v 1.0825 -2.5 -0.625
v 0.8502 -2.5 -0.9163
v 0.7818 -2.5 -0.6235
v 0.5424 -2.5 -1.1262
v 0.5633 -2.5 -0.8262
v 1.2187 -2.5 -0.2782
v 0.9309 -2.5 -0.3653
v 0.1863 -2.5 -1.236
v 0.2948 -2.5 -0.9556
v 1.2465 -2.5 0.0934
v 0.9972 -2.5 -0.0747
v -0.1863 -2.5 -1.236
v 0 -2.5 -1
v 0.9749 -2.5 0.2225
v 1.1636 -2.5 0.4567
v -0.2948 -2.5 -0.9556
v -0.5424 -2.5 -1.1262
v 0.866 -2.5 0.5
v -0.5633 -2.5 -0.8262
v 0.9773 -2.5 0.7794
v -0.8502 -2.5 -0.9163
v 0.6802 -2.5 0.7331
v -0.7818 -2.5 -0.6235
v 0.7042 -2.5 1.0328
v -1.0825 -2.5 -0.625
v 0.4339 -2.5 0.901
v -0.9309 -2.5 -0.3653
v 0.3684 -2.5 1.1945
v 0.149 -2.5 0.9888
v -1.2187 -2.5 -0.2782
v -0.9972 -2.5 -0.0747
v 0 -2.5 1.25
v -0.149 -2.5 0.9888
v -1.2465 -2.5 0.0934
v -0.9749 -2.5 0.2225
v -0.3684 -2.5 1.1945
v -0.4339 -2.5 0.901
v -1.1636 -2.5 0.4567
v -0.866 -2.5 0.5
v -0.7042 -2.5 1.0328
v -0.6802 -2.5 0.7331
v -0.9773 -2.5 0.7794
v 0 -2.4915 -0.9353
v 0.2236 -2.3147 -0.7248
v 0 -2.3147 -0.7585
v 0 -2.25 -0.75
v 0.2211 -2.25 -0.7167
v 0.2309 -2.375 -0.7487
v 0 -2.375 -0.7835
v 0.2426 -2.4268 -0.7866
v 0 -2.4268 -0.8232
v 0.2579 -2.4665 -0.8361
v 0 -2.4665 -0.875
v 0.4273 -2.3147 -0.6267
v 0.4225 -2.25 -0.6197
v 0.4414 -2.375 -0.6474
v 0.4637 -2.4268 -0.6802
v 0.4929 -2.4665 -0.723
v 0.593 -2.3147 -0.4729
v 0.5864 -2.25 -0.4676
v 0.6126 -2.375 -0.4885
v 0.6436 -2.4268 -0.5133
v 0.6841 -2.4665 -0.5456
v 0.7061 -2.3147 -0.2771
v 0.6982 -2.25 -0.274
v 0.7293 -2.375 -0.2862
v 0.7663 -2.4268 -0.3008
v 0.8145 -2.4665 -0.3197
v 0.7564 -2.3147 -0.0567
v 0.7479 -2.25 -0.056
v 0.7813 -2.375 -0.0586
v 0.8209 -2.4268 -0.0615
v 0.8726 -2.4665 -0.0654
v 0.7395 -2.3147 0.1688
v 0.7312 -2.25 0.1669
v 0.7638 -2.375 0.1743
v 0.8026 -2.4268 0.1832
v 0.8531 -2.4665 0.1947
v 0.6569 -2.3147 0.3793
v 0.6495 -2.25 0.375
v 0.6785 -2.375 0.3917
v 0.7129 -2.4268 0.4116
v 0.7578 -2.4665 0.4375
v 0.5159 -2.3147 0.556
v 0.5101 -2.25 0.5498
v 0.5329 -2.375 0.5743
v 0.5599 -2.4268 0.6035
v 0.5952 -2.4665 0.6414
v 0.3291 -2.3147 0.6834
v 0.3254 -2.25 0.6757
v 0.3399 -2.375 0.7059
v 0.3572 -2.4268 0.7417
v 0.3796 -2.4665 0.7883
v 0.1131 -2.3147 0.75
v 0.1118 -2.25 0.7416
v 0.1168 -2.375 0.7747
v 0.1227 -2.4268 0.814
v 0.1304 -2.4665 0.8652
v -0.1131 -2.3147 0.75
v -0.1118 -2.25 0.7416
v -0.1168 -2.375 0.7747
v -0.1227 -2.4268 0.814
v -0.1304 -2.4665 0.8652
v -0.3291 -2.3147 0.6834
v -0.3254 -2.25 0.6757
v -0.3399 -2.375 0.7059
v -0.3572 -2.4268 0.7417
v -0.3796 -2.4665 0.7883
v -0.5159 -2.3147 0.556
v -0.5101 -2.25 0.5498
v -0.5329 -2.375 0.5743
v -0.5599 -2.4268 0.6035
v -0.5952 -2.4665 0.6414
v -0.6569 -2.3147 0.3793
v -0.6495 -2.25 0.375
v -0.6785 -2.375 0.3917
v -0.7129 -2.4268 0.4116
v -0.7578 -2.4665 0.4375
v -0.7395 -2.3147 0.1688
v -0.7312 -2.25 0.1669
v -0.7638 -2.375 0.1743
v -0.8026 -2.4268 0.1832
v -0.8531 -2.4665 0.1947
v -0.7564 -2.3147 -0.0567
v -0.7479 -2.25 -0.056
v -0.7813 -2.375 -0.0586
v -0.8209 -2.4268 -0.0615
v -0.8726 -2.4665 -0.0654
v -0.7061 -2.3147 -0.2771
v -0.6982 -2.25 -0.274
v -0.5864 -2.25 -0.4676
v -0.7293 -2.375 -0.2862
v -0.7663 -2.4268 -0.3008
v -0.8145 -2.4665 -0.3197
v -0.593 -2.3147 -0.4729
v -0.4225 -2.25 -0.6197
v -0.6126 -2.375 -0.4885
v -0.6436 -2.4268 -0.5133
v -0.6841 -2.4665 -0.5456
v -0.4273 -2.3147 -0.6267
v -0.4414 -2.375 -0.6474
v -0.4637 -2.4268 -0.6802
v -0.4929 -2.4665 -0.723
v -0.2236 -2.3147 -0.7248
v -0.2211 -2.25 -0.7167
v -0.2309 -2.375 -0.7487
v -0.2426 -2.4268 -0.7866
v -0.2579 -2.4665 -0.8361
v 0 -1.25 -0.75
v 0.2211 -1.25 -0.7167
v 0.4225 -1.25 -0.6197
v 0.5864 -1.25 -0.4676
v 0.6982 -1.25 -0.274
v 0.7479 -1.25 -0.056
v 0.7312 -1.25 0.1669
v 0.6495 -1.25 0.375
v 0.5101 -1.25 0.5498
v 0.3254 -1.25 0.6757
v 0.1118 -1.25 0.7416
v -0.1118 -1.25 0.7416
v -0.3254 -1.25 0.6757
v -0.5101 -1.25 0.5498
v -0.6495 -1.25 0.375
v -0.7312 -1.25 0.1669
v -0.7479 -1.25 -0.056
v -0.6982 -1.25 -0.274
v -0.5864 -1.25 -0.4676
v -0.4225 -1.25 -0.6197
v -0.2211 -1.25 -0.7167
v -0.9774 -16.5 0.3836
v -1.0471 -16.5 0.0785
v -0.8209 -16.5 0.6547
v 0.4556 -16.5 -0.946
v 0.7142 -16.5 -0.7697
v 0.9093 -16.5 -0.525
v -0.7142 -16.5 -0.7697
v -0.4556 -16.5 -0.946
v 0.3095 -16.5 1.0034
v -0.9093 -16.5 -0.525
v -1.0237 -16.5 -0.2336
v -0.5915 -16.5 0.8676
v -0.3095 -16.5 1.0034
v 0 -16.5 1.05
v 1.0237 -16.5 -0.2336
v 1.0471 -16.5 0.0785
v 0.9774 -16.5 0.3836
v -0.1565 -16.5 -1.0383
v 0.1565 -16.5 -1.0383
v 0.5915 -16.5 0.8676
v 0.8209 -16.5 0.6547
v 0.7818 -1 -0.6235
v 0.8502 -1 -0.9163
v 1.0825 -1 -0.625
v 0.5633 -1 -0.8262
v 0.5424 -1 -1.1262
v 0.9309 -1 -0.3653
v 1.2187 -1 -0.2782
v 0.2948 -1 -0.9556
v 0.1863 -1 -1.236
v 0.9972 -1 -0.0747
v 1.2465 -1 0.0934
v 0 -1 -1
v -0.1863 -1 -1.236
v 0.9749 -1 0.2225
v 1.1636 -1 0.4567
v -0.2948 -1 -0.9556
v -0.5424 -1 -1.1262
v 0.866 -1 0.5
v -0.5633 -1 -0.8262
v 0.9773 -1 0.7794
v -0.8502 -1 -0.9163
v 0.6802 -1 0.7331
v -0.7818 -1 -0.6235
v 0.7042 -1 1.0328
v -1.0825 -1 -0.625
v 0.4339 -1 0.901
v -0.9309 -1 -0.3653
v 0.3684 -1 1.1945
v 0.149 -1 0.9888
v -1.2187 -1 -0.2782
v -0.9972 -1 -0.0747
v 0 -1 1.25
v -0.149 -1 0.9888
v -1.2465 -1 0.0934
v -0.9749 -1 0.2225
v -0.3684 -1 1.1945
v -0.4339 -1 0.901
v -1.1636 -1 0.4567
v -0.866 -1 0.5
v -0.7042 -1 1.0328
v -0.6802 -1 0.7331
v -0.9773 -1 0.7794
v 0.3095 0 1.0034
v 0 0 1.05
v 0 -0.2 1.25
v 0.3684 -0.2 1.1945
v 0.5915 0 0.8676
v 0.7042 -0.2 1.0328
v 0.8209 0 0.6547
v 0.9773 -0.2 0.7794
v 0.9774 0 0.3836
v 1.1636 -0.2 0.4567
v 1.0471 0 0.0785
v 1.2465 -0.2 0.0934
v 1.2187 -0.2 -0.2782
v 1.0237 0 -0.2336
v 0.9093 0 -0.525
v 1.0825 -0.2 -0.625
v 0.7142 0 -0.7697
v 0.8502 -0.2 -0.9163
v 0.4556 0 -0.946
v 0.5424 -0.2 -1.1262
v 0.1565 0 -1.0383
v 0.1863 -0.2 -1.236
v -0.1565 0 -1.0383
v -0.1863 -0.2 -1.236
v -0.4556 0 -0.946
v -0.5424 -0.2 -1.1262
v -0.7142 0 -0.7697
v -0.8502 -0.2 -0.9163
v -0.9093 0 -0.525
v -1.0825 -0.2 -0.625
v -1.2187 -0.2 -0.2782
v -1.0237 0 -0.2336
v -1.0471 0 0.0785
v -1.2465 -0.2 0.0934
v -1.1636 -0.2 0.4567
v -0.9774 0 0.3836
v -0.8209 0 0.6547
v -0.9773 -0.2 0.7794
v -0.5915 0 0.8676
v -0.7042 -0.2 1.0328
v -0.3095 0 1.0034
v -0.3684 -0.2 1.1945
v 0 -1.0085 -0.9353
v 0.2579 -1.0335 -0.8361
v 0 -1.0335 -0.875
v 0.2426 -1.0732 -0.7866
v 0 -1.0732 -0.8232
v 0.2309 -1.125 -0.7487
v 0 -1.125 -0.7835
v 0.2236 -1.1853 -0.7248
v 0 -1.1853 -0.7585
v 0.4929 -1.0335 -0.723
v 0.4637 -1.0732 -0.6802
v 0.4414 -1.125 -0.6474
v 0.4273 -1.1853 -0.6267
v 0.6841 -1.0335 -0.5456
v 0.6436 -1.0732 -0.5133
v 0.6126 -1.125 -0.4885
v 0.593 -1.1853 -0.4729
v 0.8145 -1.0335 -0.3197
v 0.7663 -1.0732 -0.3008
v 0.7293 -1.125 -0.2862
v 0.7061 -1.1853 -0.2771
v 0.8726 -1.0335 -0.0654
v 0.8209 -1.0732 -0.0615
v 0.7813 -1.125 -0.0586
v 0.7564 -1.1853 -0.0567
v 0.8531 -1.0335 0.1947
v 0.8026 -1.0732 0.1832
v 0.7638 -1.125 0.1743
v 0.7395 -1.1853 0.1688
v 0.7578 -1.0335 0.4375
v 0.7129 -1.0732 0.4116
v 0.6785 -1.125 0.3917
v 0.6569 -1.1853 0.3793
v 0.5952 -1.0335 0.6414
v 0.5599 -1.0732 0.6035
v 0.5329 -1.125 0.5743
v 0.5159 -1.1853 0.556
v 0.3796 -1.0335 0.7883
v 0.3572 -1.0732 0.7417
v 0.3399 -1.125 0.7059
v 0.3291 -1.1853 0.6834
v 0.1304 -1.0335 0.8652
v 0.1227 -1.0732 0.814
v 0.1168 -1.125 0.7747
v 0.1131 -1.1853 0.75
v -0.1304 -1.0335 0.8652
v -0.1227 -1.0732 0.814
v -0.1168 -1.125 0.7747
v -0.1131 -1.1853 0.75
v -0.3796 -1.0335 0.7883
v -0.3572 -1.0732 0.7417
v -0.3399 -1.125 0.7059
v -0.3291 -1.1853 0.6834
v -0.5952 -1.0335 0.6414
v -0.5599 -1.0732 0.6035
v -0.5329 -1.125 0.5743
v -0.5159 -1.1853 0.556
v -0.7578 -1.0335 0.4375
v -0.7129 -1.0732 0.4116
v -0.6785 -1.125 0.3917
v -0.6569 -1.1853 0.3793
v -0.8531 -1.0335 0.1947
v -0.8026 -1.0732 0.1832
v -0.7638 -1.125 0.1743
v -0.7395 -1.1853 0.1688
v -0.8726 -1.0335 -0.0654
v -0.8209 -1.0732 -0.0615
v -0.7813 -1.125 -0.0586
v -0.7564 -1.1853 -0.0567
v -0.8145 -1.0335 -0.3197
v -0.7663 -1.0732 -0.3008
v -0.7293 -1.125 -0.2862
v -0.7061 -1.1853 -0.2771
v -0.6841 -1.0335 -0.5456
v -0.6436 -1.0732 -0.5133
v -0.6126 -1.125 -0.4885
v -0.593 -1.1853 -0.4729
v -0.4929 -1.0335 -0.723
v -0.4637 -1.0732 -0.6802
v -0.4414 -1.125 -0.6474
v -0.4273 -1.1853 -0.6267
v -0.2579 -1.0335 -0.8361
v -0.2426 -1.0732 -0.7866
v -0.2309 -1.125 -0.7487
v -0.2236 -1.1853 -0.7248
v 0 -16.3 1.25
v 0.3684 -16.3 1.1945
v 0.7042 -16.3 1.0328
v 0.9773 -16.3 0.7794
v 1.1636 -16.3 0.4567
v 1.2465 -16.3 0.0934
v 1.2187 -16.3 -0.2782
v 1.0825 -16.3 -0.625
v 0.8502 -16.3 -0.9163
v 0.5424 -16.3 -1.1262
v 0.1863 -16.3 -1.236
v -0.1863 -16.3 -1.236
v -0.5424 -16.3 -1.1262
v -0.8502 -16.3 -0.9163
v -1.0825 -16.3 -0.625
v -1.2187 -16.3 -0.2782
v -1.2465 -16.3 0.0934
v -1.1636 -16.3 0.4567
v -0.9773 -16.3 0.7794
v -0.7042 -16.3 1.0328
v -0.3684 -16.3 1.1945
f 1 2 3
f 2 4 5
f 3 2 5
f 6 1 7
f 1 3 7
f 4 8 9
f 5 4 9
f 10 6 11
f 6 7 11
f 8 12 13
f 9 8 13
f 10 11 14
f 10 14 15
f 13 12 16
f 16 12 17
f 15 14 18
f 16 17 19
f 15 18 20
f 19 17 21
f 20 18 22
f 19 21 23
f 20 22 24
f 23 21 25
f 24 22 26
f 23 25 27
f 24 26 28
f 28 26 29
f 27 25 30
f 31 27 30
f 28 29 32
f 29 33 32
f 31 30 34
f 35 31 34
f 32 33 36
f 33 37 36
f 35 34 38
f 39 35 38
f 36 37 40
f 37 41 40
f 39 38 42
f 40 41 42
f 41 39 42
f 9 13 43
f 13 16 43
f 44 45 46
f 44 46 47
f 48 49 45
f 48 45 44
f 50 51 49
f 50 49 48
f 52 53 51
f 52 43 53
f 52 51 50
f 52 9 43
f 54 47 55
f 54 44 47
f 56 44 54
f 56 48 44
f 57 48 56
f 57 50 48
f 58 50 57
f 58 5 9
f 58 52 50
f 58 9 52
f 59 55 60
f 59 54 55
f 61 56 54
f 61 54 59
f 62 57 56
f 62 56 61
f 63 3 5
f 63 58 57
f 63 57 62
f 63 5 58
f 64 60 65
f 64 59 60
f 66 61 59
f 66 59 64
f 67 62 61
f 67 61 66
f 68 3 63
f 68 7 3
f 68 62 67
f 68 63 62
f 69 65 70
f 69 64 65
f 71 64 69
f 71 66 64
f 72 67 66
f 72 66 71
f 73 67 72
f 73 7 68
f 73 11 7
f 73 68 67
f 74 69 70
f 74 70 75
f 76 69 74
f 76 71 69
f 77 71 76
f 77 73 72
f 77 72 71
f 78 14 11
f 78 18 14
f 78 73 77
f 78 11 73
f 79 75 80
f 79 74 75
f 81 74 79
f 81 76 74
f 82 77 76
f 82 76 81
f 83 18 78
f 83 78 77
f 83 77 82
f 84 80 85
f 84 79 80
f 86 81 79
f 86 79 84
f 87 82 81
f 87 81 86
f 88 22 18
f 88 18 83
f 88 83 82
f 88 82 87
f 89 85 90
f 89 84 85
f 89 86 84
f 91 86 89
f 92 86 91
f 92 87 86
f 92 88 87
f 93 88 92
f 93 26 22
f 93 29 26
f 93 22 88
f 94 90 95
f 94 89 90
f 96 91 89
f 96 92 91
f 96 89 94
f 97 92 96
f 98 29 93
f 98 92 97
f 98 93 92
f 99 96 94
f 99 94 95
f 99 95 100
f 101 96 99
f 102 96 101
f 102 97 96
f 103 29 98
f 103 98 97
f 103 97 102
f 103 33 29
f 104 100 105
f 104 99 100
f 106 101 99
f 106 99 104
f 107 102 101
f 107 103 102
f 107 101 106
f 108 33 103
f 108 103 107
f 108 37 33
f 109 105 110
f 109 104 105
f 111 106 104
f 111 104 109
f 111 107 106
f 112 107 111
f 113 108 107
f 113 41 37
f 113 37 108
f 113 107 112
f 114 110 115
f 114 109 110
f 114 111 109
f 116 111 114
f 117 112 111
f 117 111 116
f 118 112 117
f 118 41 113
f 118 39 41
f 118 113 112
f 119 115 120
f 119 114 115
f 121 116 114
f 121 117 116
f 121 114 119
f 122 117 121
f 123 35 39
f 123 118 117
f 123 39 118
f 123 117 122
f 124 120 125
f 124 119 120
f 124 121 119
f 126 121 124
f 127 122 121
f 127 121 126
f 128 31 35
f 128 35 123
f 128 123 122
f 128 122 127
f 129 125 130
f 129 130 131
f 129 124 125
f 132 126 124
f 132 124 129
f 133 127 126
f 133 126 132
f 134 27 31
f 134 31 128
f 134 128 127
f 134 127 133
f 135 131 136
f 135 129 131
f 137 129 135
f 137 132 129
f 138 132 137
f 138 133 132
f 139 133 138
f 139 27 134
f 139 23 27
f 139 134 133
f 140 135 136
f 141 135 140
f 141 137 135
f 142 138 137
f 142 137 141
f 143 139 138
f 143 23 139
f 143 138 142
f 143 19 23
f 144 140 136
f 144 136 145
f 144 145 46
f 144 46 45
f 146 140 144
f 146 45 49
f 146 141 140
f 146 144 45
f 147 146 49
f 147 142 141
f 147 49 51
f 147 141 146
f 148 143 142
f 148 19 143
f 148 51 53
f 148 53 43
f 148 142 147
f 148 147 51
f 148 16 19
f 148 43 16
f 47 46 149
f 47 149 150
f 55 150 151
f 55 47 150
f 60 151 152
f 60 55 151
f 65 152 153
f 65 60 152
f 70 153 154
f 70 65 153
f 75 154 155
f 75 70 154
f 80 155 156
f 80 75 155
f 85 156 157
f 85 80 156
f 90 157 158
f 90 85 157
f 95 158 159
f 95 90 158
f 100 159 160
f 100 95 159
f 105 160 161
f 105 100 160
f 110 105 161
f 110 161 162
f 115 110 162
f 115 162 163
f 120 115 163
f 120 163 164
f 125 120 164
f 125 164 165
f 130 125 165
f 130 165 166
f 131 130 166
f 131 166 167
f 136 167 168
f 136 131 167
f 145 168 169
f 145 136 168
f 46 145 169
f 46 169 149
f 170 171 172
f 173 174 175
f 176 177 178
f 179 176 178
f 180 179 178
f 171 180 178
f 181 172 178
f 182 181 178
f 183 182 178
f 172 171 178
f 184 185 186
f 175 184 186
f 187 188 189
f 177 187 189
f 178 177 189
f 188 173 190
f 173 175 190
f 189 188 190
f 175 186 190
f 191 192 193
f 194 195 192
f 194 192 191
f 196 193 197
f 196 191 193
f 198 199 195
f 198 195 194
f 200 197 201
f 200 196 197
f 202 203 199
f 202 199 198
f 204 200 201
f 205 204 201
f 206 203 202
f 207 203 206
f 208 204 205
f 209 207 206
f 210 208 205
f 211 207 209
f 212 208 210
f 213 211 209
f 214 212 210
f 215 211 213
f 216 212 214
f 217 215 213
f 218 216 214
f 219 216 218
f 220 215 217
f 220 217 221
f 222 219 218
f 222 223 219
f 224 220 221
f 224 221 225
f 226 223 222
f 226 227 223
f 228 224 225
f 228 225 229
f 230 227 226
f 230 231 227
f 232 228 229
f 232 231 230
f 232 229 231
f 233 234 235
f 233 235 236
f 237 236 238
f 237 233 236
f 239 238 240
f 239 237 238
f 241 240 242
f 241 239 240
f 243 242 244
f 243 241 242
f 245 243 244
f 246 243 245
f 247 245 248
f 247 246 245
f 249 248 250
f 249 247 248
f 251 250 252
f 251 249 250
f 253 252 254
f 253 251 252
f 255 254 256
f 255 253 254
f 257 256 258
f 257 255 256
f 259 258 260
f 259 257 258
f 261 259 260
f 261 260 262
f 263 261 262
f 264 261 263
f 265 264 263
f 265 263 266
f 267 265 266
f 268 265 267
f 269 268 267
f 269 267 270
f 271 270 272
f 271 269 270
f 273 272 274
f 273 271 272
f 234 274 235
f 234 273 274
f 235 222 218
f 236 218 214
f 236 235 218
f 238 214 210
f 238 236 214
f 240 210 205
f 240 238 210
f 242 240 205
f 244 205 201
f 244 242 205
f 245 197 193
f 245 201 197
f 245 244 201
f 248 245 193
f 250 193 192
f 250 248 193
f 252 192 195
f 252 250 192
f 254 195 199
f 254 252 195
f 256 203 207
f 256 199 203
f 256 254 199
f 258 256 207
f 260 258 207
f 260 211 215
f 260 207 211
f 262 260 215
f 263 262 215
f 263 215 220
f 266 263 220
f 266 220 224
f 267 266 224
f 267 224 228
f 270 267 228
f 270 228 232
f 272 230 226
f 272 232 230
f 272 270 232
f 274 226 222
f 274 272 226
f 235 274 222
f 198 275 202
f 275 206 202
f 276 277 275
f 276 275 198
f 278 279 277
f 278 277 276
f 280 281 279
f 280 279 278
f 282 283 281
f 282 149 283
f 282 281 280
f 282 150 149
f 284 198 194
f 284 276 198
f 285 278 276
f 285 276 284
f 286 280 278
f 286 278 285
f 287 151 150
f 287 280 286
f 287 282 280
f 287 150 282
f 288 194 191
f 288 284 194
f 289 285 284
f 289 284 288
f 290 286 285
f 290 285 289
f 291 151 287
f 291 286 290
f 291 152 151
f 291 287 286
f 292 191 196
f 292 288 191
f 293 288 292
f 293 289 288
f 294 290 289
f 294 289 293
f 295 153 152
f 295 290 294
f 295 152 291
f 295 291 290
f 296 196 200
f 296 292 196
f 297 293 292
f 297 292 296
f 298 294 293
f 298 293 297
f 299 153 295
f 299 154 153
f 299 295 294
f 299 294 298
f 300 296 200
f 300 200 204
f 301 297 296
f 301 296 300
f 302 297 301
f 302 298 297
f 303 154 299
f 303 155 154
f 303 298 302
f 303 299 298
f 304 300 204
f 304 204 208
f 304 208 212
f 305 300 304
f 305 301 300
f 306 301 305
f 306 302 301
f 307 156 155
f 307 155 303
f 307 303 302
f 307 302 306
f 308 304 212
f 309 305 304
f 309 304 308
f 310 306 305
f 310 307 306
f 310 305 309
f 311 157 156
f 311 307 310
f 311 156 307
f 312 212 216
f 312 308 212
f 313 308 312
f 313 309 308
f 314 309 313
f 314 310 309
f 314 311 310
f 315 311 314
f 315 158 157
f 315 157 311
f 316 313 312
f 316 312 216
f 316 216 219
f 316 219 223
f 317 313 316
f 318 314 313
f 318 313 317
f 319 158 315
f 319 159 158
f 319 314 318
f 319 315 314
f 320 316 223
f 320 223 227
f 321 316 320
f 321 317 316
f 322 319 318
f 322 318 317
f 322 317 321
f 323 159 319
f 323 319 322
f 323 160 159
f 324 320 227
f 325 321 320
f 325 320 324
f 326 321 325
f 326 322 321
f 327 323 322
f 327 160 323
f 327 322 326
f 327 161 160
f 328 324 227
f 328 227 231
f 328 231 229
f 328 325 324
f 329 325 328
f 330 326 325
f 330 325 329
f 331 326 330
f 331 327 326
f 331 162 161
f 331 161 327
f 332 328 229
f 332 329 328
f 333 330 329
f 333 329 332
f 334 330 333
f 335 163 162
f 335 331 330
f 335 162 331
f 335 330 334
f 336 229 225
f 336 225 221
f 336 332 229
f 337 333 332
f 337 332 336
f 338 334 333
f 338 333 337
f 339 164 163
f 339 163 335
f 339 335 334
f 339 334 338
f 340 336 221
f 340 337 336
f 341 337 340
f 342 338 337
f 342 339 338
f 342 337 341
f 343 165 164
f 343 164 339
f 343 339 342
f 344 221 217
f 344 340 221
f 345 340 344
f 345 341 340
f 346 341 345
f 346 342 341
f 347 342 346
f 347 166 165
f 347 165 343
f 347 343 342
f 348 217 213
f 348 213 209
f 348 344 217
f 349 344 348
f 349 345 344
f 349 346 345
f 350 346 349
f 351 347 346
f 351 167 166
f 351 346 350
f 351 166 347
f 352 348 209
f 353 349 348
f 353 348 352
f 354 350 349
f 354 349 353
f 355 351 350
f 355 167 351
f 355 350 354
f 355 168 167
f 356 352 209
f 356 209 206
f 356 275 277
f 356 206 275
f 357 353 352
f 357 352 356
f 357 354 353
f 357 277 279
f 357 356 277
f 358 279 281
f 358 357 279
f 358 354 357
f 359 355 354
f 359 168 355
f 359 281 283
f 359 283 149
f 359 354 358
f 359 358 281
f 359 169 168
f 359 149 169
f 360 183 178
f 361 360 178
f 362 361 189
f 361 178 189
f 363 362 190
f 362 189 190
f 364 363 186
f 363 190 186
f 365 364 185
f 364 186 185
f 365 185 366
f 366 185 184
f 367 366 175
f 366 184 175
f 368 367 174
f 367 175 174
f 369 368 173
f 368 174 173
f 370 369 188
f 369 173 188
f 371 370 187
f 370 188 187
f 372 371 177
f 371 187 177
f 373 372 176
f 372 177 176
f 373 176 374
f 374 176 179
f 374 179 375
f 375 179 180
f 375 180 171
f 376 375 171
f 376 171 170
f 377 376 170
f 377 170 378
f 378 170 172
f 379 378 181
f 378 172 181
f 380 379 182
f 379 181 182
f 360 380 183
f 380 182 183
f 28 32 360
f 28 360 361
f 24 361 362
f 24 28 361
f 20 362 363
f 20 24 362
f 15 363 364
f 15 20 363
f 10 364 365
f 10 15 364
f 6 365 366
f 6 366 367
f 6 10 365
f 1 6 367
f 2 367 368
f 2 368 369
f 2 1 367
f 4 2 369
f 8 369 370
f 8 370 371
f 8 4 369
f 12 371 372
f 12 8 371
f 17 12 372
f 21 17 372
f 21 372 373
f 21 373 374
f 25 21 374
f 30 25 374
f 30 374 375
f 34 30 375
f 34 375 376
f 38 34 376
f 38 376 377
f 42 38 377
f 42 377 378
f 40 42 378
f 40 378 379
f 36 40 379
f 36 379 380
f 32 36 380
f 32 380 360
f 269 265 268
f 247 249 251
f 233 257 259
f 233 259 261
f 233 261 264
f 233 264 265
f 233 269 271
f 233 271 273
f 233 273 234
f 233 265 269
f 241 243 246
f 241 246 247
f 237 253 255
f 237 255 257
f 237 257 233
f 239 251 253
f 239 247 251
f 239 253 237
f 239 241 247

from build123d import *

# Parameters (mm, degrees)
SKETCH1_R      = 1.25
EXTRUDE1_DEPTH = 16.5
CHAMFER1_SIZE  = 0.2
SKETCH2_R      = 1.25
SKETCH2_R_2    = 0.75
EXTRUDE2_DEPTH = 1.5
FILLET1_R      = 0.25


with BuildPart() as part:
    # Sketch1 → Extrude1 (new body)
    with BuildSketch(Plane(origin=(0, 0, 0), x_dir=(1, 0, 0), z_dir=(0, 1, 0))):
        with Locations(Location((0, 0, 0), (0, 0, 270))):  # turned: the seam where the file's is
            Circle(SKETCH1_R)
    extrude(amount=-EXTRUDE1_DEPTH)

    # Chamfer1
    chamfer1_edges = [part.edges().sort_by_distance(p)[0] for p in [
        (0, 0, -1.25),
        (0, -16.5, -1.25),
    ]]
    chamfer(chamfer1_edges, length=CHAMFER1_SIZE)

    # Sketch2 → Extrude2 (cut)
    with BuildSketch(Plane.XZ.offset(2.5)):
        with Locations(Location((0, 0, 0), (0, 0, 90))):  # turned: the seam where the file's is
            Circle(SKETCH2_R)
        with Locations(Location((0, 0, 0), (0, 0, 270))):  # turned: the seam where the file's is
            Circle(SKETCH2_R_2, mode=Mode.SUBTRACT)
    extrude(amount=-EXTRUDE2_DEPTH, mode=Mode.SUBTRACT)

    # Fillet1
    fillet1_edges = [part.edges().sort_by_distance(p)[0] for p in [
        (0, -1, 0.75),
        (0, -2.5, 0.75),
    ]]
    fillet(fillet1_edges, radius=FILLET1_R)


solid = part.part
